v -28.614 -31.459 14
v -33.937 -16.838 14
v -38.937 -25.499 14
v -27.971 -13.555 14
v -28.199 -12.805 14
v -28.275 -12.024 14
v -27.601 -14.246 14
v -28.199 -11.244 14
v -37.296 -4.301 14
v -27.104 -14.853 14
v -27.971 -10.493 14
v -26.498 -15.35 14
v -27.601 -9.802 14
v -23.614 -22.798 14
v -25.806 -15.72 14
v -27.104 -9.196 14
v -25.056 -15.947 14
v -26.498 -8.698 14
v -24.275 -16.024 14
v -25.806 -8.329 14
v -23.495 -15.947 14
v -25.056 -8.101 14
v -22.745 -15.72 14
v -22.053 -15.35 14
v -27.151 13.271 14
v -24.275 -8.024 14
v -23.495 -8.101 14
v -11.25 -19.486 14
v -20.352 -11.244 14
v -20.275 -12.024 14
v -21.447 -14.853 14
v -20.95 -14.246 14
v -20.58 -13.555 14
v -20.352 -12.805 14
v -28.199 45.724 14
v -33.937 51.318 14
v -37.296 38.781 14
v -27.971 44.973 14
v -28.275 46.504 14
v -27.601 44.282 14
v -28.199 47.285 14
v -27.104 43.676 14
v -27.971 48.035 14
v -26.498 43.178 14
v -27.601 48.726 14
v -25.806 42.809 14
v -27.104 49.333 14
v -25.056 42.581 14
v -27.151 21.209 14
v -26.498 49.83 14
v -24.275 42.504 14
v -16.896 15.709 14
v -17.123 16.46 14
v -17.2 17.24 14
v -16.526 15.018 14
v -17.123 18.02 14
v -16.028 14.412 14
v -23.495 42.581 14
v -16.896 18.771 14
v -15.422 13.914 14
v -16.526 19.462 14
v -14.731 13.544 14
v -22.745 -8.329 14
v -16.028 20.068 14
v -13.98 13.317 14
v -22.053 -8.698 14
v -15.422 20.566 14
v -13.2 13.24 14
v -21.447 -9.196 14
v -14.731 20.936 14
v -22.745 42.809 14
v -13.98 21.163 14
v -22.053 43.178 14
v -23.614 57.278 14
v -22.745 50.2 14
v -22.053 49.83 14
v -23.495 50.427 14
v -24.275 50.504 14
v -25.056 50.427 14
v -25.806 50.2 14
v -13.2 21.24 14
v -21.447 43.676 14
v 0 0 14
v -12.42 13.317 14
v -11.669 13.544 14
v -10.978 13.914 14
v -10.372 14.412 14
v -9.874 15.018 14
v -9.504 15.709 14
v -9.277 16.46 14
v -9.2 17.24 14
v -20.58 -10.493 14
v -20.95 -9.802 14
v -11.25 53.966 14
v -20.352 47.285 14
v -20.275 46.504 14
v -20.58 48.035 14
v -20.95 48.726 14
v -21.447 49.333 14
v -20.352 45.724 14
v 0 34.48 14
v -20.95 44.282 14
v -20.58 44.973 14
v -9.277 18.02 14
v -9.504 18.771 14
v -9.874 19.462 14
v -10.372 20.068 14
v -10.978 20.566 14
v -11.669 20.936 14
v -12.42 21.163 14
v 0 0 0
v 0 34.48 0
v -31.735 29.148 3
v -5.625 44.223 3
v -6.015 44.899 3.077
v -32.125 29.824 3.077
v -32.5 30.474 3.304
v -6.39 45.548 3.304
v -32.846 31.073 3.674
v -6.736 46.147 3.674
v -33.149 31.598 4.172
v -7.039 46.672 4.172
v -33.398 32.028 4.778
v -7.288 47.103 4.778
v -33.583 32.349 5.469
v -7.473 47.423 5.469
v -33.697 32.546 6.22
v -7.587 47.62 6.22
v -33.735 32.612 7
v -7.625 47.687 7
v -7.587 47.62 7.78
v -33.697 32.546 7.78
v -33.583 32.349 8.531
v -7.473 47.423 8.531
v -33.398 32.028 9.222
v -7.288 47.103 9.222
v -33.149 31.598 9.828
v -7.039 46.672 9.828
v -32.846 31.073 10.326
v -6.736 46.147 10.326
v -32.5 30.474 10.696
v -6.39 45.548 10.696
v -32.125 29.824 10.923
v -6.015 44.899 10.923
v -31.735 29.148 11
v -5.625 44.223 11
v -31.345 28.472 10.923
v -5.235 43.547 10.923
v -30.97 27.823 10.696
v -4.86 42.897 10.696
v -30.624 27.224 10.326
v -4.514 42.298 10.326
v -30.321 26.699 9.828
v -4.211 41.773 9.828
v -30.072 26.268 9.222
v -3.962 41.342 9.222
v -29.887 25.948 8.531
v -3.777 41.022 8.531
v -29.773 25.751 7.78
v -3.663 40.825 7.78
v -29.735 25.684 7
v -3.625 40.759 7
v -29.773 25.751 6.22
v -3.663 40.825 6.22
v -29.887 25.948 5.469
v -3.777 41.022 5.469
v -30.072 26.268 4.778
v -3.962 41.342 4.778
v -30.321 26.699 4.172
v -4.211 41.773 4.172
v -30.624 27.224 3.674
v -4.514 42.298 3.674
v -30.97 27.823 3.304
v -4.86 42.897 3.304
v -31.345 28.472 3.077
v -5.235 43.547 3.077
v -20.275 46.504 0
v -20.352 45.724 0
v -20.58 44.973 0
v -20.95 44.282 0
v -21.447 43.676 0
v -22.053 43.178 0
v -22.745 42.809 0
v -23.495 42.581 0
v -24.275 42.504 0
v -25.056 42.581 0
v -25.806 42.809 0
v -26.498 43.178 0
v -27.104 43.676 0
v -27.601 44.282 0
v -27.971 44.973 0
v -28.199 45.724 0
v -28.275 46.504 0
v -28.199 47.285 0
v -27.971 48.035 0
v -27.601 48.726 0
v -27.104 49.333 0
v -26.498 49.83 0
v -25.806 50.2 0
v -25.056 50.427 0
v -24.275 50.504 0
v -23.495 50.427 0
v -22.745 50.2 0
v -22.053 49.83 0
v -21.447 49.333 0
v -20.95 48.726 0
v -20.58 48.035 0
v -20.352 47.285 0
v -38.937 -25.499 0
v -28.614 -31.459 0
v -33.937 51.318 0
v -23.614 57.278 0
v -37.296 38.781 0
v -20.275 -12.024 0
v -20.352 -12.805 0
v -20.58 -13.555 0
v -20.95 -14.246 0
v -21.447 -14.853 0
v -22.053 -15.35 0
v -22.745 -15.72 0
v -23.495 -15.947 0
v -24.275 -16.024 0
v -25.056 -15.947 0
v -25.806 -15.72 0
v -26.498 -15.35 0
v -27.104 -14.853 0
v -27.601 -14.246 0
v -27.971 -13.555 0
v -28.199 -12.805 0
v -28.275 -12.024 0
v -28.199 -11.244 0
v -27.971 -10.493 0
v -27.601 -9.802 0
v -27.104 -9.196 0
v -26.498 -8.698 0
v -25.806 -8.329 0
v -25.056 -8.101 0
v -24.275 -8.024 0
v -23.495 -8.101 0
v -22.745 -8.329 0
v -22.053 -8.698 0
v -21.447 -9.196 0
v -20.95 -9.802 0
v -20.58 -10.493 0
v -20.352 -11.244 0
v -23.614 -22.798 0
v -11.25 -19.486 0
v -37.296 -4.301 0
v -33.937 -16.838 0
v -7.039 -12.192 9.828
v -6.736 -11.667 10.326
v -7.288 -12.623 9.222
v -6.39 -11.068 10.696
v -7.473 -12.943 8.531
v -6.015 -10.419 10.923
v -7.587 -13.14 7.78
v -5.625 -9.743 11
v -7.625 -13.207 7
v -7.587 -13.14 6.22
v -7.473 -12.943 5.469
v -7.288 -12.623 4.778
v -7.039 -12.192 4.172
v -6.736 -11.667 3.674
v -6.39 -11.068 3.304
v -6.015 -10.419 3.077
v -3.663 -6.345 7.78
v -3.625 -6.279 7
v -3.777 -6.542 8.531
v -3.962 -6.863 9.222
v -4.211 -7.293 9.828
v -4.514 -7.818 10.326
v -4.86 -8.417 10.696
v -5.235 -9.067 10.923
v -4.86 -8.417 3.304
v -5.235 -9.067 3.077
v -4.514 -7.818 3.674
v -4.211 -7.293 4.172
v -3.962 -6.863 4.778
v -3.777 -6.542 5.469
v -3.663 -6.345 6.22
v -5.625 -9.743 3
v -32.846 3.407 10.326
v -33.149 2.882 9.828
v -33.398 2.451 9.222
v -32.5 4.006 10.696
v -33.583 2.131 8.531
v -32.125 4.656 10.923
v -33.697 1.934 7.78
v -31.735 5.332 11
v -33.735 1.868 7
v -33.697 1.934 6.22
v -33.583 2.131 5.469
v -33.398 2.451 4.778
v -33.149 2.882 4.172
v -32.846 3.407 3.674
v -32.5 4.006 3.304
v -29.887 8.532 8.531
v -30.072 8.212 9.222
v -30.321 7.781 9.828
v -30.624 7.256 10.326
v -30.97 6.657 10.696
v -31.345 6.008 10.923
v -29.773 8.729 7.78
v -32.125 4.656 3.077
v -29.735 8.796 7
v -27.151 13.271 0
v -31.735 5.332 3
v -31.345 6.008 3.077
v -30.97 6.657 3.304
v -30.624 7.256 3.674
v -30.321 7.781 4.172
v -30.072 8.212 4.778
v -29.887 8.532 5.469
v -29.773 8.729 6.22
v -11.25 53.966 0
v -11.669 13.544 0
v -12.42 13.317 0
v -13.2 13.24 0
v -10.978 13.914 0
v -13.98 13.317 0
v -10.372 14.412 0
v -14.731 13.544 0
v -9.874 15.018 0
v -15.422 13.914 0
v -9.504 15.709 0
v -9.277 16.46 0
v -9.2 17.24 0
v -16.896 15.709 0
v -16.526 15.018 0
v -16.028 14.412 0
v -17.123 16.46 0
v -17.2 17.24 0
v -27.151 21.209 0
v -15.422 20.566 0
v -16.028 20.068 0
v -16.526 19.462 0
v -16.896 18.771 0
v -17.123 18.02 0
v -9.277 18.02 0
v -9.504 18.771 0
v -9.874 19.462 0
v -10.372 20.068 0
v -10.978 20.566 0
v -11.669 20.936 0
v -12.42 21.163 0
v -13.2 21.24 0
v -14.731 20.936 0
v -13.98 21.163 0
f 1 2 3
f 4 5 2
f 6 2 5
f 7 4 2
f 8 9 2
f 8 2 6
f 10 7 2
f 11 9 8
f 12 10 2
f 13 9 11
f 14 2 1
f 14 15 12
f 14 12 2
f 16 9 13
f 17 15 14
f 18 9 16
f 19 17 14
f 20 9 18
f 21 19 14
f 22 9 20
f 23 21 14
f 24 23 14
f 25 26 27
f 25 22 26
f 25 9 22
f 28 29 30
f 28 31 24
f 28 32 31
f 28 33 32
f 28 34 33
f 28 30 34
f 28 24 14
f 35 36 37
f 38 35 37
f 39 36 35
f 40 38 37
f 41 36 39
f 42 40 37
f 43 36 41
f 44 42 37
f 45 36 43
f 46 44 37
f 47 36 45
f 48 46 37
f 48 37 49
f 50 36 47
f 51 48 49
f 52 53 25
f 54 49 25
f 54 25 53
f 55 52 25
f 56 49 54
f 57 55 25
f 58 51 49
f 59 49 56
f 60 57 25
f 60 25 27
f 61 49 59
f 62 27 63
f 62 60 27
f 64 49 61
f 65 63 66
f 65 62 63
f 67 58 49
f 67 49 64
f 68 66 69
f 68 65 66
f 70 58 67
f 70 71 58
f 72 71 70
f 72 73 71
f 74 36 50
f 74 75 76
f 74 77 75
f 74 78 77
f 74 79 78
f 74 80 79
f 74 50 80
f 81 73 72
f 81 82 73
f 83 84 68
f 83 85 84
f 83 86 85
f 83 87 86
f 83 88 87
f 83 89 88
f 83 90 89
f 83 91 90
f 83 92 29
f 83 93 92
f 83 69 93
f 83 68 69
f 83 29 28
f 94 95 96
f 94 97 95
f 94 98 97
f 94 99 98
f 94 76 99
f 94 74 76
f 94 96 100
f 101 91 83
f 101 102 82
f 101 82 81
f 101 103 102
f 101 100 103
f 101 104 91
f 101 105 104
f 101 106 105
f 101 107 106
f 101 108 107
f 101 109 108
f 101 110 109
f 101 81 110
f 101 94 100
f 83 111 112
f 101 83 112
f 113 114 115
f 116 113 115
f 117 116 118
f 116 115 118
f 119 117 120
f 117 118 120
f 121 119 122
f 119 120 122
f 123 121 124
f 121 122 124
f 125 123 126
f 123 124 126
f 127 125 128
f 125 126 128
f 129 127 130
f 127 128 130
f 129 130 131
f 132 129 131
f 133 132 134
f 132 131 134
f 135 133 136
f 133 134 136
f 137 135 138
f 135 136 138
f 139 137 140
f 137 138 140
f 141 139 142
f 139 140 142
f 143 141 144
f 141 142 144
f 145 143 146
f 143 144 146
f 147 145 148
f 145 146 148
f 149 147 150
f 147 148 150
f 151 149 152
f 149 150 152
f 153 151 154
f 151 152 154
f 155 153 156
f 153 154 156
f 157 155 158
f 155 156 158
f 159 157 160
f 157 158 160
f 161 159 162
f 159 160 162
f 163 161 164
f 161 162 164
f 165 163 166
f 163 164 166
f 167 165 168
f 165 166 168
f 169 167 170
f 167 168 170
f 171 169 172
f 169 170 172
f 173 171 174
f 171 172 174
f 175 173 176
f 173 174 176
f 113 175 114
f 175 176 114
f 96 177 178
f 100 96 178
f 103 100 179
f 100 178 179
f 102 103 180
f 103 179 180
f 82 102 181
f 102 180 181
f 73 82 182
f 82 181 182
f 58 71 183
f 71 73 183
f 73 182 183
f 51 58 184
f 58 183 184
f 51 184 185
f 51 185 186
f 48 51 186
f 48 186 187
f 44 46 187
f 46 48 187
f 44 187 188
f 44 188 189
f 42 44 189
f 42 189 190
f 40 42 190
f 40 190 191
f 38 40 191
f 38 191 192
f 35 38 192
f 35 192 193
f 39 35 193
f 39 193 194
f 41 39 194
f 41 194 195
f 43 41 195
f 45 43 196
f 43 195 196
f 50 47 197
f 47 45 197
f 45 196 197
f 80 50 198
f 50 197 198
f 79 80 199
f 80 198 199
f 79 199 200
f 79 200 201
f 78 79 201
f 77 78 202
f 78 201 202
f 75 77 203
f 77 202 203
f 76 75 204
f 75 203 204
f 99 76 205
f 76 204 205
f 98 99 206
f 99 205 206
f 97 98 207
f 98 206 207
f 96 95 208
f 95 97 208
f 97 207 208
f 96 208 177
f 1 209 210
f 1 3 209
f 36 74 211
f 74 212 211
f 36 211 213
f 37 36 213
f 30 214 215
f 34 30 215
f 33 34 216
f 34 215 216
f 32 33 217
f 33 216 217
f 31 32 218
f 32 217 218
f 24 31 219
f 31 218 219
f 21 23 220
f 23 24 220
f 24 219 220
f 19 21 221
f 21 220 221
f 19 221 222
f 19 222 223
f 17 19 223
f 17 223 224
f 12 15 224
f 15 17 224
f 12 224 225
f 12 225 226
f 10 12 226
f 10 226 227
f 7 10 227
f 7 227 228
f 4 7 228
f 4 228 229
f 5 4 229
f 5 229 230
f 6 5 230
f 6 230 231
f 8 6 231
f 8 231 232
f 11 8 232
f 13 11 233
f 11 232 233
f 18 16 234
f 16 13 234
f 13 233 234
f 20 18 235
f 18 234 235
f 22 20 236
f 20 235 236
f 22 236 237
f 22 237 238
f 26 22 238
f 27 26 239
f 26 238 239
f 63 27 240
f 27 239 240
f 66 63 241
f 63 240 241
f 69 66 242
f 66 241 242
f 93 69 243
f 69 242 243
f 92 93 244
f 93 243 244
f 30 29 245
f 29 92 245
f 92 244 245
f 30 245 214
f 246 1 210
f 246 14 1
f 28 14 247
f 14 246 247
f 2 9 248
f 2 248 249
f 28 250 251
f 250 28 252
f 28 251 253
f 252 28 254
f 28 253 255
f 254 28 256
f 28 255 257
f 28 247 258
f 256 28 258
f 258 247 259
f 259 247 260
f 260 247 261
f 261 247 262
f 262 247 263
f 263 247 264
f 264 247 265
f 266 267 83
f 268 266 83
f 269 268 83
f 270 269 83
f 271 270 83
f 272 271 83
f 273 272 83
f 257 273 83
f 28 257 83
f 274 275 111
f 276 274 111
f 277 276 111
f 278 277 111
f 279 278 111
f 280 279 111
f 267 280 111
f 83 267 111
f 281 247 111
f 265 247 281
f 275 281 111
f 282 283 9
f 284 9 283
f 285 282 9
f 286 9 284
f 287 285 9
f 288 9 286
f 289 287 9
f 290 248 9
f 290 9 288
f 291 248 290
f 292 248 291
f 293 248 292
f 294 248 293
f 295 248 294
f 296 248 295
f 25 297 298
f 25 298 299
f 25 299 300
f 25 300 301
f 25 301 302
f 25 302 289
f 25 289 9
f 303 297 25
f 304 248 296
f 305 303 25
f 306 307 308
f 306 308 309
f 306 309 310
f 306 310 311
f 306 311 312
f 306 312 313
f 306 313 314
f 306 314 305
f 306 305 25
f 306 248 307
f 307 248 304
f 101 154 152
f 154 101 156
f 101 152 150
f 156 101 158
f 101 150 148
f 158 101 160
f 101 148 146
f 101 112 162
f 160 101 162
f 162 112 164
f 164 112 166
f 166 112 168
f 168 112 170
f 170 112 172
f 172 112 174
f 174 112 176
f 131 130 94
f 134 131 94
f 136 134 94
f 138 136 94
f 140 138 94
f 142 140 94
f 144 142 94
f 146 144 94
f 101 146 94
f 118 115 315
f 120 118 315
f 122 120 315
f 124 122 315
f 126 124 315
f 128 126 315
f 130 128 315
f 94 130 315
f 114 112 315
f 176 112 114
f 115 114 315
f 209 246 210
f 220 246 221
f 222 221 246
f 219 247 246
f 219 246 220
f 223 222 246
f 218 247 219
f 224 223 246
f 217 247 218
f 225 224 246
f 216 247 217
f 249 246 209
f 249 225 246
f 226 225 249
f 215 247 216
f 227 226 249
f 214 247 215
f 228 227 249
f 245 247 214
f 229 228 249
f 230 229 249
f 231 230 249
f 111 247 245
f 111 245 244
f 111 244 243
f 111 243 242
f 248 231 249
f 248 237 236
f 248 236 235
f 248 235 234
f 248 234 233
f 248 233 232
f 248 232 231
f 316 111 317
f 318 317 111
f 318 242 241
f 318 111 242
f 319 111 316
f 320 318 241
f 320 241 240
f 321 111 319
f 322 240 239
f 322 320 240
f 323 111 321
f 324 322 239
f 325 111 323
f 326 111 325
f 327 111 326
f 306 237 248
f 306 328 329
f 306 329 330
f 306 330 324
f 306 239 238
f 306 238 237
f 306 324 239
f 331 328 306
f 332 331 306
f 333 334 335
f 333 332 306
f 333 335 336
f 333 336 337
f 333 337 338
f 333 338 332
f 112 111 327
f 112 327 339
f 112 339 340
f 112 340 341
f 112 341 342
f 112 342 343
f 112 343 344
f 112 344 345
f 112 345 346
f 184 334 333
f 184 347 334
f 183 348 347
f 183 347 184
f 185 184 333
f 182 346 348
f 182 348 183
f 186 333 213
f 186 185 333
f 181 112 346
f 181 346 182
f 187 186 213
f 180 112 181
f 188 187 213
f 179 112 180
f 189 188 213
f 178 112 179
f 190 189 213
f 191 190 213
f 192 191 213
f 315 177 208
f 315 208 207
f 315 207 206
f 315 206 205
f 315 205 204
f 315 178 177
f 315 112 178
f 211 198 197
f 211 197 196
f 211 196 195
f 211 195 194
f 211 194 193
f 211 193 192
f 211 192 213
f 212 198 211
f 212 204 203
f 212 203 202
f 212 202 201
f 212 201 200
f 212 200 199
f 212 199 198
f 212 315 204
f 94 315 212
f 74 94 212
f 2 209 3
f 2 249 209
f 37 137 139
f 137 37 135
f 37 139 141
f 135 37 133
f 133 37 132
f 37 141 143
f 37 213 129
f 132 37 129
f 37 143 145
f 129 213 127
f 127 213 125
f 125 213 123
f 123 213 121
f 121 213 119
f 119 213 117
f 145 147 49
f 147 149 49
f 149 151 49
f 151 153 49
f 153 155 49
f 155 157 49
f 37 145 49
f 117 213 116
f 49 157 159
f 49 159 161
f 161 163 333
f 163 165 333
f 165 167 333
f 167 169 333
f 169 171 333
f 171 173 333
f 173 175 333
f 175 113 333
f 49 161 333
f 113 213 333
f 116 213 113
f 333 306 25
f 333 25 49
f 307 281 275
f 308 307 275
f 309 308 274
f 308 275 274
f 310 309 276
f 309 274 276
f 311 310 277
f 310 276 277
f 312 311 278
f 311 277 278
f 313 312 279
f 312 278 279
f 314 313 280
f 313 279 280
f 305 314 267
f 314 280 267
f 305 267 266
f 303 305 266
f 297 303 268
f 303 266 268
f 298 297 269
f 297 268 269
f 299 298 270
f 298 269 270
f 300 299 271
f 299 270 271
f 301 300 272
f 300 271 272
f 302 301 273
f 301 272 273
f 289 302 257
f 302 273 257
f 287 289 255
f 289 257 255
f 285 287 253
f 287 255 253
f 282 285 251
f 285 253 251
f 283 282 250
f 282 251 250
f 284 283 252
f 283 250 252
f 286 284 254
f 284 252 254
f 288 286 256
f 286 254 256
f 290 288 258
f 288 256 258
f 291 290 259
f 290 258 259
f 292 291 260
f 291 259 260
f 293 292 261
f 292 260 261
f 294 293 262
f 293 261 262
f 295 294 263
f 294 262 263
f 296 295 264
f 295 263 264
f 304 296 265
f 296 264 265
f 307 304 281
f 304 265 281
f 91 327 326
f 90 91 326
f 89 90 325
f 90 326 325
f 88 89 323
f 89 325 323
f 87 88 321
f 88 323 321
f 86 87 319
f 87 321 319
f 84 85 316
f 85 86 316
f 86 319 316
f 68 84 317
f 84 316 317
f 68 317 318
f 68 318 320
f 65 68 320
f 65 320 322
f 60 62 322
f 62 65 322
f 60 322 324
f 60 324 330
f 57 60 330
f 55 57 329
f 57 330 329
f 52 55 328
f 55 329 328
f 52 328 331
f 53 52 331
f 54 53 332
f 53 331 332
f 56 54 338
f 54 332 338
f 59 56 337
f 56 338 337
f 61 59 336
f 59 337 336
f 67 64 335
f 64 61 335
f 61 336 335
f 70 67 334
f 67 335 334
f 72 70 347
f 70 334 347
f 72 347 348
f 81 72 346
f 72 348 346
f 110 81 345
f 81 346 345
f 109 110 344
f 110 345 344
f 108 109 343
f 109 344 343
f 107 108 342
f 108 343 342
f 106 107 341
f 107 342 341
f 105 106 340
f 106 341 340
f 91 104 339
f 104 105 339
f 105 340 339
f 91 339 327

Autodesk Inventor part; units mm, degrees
ref_plane "YZ Plane" through (0, 0, 0) normal (1, 0, 0) x (0, 1, 0)
ref_plane "XZ Plane" through (0, 0, 0) normal (0, 1, 0) x (-1, 0, 0)
ref_plane "XY Plane" through (0, 0, 0) normal (0, 0, 1) x (1, 0, 0)
sketch "Sketch1" plane through (0, 0, 0) normal (0, 0, 1) x (1, 0, 0)
  line L0 (0, 0) -> (0, 34.48)
  line L1 (0, 34.48) -> (-11.25, 53.9656)
  line L2 (-11.25, 53.9656) -> (-23.6139, 57.2785)
  line L3 (-23.6139, 57.2785) -> (-33.9369, 51.3185)
  line L4 (-33.9369, 51.3185) -> (-37.2963, 38.7807)
  line L5 (-37.2963, 38.7807) -> (-27.1513, 21.2091)
  line L6 (-37.2963, -4.3007) -> (-33.9369, -16.8385)
  line L7 (-33.9369, -16.8385) -> (-23.6139, -22.7985)
  line L8 (-23.6139, -22.7985) -> (-11.25, -19.4856)
  line L9 (-11.25, -19.4856) -> (0, 0)
  line L10 (-37.2963, -4.3007) -> (-27.1513, 13.2709)
  line L11 (-27.1513, 13.2709) -> (-27.1513, 21.2091)
  circle A0 centre (-24.2754, 46.5042) radius 4
  circle A1 centre (-24.2754, -12.0242) radius 4
  line L12 (-33.9369, -16.8385) -> (-57.9984, -2.9465)
  line L13 (-33.9369, -16.8385) -> (-24.2152, 0)
  line L14 (-27.1513, 55.2361) -> (-5.625, 67.6643)
  line L15 (-23.6139, 57.2785) -> (-11.8125, 36.8379)
  circle A2 centre (-13.2, 17.24) radius 4
  dimension "d0" = 34.48
  dimension "d1" = 22.5
  dimension "d2" = 12.8
  dimension "d3" = 11.92
  dimension "d4" = 12.98
  dimension "d10" = 150
  dimension "d11" = 135
  dimension "d12" = 135
  dimension "d13" = 135
  dimension "d14" = 135
  dimension "d21" = 150
  dimension "d22" = 22.5
  dimension "d23" = 135
  dimension "d24" = 12.8
  dimension "d25" = 225
  dimension "d26" = 11.92
  dimension "d27" = 12.98
  dimension "d28" = 135
  dimension "d29" = 20.29
  dimension "d30" = 135
  dimension "d31" = 7.9382
  dimension "d32" = 9
  dimension "d33" = 9
  dimension "d34" = 5.96
  dimension "d35" = 5.96
  dimension "d36" = 8
  dimension "d37" = 8
  dimension "d38" = 13.2
  dimension "d39" = 8
extrude "Extrusion1" add sketch "Sketch1" along normal blind 14
sketch "Sketch2" plane through (0, 34.48, 14) normal (0.866, 0.5, 0) x (0, 0, -1)
  line L0 (0, 22.5) -> (0, 0) projected
  line L1 (14, 0) -> (0, 0) projected
  line L2 (14, 22.5) -> (0, 22.5) projected
  circle A0 centre (7, 11.25) radius 4
  point P0 (14, -29.8606)
  dimension "d42" = 22.5
  dimension "d43" = 11.25
  dimension "d44" = 7
  dimension "d52" = 8
extrude "Extrusion2" cut sketch "Sketch2" against normal blind 40
sketch "Sketch3" plane through (-11.25, -19.4856, 14) normal (0.866, -0.5, 0) x (0, 0, -1)
  line L0 (14, 0) -> (14, 22.5) projected
  line L1 (14, 22.5) -> (0, 22.5) projected
  circle A0 centre (7, 11.25) radius 4
  line L2 (14, -9.051) -> (0, -9.051) projected
  dimension "d47" = 8
  dimension "d48" = 11.25
  dimension "d49" = 7
  dimension "d64" = 20.301
extrude "Extrusion3" cut sketch "Sketch3" against normal blind 40
sketch "Sketch5" plane through (-33.9369, -16.8385, 0) normal (-0.5, -0.866, 0) x (0.866, -0.5, 0)
  line L0 (11.92, 0) -> (0, 0)
  line L1 (0, 0) -> (0, 14)
  line L2 (0, 14) -> (11.92, 14)
  line L3 (11.92, 14) -> (11.92, 0)
  point P0 (20.971, 0)
extrude "Extrusion4" add sketch "Sketch5" along normal blind 10
properties part number "Vertex Bootm with foot"
